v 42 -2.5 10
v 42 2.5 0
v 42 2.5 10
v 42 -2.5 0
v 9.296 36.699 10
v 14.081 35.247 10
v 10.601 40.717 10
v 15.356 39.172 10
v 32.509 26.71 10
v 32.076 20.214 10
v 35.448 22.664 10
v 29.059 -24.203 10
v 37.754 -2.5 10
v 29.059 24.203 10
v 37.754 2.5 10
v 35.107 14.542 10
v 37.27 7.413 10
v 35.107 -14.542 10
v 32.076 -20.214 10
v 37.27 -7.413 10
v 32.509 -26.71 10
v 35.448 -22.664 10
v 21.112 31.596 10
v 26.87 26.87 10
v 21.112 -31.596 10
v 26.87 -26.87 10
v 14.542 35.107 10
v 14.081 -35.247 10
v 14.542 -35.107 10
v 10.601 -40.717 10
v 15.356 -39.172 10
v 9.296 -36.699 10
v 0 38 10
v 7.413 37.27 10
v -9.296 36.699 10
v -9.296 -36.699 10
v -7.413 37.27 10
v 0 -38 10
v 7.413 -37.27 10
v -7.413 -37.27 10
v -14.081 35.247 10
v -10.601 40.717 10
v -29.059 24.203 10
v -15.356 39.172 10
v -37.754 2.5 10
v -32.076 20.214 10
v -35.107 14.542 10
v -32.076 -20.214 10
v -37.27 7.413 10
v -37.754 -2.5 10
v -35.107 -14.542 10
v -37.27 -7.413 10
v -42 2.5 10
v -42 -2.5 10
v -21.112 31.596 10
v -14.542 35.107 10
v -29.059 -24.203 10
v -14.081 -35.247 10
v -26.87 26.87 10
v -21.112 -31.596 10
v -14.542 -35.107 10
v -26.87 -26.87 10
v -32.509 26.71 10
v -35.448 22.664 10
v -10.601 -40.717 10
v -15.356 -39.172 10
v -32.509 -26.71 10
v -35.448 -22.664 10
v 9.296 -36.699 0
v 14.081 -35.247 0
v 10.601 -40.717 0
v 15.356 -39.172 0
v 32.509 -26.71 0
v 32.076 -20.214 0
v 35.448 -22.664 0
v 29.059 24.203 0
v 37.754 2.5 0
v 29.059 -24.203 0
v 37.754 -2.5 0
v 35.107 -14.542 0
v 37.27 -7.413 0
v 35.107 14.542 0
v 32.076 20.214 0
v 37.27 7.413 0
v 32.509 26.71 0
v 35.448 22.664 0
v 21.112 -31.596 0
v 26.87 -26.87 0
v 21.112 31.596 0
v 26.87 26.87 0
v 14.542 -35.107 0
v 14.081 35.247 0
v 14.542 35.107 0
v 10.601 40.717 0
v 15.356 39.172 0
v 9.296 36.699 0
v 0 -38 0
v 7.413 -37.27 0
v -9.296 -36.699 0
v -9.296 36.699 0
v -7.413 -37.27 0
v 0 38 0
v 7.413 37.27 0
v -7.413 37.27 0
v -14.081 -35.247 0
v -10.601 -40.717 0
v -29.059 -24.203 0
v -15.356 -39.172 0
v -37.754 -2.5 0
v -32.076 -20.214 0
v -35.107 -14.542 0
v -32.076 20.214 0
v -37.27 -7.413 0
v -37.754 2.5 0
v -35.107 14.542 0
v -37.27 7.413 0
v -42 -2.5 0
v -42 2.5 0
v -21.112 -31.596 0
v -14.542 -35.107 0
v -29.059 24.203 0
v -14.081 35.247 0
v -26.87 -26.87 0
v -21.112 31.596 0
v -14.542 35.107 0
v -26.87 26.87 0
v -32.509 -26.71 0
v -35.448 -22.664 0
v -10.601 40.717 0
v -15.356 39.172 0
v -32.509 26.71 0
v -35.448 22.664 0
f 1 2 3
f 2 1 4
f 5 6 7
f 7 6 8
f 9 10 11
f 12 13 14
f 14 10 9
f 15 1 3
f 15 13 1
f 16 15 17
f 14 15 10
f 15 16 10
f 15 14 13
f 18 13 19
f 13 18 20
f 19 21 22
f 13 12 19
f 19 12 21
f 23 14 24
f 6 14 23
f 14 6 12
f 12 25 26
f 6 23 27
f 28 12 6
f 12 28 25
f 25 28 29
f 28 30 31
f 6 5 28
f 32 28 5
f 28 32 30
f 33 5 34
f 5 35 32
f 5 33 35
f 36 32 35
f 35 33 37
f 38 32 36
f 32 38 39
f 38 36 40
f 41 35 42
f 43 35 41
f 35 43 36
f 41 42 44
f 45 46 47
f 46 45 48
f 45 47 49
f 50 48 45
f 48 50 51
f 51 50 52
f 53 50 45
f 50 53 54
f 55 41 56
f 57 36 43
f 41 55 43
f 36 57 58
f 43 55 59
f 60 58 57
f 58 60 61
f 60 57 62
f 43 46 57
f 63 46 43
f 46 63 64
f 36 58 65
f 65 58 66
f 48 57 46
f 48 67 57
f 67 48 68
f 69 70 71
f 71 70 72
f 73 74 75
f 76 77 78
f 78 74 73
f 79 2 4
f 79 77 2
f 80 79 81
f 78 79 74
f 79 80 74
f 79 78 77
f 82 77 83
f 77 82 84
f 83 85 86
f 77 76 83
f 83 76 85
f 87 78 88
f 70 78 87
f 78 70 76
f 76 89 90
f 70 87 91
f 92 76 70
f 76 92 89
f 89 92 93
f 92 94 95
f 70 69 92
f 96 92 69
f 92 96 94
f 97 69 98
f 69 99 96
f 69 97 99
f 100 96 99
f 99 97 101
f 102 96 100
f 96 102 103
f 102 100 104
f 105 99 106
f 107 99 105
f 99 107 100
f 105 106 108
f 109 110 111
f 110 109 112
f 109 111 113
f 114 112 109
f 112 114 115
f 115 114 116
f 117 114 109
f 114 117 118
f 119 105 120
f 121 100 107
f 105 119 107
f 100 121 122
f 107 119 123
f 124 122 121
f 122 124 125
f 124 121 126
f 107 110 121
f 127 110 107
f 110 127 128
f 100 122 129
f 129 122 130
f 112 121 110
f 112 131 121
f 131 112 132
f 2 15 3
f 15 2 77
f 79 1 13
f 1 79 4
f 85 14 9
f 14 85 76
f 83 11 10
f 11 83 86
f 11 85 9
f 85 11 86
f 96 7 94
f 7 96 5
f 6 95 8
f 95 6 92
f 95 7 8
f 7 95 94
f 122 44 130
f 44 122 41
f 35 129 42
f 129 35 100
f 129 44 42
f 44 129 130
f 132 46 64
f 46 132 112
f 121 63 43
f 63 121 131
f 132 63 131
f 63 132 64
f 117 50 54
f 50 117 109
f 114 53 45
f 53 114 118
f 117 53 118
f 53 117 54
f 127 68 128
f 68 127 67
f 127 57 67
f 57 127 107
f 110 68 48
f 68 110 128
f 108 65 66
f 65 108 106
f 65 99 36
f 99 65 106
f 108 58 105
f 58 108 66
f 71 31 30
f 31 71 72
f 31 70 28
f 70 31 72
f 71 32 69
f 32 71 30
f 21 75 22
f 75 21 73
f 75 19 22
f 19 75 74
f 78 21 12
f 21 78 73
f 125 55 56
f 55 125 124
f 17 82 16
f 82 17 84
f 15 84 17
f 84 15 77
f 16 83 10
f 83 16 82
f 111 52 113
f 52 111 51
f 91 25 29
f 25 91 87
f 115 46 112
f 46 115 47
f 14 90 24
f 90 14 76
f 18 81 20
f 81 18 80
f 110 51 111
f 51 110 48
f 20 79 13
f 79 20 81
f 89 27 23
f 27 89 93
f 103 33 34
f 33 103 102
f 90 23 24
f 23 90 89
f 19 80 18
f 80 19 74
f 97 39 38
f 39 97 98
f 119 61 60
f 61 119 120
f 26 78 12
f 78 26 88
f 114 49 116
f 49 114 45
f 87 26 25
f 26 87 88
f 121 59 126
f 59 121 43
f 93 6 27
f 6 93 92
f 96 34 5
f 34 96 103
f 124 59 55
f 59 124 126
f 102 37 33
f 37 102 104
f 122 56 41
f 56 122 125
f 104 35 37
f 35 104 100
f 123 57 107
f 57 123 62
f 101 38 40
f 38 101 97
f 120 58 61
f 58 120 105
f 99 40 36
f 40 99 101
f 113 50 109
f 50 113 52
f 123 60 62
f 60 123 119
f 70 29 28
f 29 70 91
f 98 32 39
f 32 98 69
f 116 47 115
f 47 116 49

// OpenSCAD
$fn = 32;

// ----------------------------------------------------------------------
// Spur blank: plain gear blank
// ----------------------------------------------------------------------

// --- parameters (mm) ---
disc_r = 38;              // blank root radius
disc_t = 10;              // blank thickness
n_teeth = 10;             // stub tooth count
tooth_w = 5;              // tooth width at the root
tooth_h = 4;              // tooth height above the root

out_r = disc_r + tooth_h;  // tip radius
bbox_x = 84.0;  // measured width over the teeth
bbox_y = 81.43;  // measured depth over the teeth

union() {
  cylinder(r = disc_r, h = disc_t);
  for (i = [0 : n_teeth - 1])
    rotate([0, 0, i * 360 / n_teeth])
      translate([disc_r - 1, -tooth_w / 2, 0])
        cube([tooth_h + 1, tooth_w, disc_t]);
}
